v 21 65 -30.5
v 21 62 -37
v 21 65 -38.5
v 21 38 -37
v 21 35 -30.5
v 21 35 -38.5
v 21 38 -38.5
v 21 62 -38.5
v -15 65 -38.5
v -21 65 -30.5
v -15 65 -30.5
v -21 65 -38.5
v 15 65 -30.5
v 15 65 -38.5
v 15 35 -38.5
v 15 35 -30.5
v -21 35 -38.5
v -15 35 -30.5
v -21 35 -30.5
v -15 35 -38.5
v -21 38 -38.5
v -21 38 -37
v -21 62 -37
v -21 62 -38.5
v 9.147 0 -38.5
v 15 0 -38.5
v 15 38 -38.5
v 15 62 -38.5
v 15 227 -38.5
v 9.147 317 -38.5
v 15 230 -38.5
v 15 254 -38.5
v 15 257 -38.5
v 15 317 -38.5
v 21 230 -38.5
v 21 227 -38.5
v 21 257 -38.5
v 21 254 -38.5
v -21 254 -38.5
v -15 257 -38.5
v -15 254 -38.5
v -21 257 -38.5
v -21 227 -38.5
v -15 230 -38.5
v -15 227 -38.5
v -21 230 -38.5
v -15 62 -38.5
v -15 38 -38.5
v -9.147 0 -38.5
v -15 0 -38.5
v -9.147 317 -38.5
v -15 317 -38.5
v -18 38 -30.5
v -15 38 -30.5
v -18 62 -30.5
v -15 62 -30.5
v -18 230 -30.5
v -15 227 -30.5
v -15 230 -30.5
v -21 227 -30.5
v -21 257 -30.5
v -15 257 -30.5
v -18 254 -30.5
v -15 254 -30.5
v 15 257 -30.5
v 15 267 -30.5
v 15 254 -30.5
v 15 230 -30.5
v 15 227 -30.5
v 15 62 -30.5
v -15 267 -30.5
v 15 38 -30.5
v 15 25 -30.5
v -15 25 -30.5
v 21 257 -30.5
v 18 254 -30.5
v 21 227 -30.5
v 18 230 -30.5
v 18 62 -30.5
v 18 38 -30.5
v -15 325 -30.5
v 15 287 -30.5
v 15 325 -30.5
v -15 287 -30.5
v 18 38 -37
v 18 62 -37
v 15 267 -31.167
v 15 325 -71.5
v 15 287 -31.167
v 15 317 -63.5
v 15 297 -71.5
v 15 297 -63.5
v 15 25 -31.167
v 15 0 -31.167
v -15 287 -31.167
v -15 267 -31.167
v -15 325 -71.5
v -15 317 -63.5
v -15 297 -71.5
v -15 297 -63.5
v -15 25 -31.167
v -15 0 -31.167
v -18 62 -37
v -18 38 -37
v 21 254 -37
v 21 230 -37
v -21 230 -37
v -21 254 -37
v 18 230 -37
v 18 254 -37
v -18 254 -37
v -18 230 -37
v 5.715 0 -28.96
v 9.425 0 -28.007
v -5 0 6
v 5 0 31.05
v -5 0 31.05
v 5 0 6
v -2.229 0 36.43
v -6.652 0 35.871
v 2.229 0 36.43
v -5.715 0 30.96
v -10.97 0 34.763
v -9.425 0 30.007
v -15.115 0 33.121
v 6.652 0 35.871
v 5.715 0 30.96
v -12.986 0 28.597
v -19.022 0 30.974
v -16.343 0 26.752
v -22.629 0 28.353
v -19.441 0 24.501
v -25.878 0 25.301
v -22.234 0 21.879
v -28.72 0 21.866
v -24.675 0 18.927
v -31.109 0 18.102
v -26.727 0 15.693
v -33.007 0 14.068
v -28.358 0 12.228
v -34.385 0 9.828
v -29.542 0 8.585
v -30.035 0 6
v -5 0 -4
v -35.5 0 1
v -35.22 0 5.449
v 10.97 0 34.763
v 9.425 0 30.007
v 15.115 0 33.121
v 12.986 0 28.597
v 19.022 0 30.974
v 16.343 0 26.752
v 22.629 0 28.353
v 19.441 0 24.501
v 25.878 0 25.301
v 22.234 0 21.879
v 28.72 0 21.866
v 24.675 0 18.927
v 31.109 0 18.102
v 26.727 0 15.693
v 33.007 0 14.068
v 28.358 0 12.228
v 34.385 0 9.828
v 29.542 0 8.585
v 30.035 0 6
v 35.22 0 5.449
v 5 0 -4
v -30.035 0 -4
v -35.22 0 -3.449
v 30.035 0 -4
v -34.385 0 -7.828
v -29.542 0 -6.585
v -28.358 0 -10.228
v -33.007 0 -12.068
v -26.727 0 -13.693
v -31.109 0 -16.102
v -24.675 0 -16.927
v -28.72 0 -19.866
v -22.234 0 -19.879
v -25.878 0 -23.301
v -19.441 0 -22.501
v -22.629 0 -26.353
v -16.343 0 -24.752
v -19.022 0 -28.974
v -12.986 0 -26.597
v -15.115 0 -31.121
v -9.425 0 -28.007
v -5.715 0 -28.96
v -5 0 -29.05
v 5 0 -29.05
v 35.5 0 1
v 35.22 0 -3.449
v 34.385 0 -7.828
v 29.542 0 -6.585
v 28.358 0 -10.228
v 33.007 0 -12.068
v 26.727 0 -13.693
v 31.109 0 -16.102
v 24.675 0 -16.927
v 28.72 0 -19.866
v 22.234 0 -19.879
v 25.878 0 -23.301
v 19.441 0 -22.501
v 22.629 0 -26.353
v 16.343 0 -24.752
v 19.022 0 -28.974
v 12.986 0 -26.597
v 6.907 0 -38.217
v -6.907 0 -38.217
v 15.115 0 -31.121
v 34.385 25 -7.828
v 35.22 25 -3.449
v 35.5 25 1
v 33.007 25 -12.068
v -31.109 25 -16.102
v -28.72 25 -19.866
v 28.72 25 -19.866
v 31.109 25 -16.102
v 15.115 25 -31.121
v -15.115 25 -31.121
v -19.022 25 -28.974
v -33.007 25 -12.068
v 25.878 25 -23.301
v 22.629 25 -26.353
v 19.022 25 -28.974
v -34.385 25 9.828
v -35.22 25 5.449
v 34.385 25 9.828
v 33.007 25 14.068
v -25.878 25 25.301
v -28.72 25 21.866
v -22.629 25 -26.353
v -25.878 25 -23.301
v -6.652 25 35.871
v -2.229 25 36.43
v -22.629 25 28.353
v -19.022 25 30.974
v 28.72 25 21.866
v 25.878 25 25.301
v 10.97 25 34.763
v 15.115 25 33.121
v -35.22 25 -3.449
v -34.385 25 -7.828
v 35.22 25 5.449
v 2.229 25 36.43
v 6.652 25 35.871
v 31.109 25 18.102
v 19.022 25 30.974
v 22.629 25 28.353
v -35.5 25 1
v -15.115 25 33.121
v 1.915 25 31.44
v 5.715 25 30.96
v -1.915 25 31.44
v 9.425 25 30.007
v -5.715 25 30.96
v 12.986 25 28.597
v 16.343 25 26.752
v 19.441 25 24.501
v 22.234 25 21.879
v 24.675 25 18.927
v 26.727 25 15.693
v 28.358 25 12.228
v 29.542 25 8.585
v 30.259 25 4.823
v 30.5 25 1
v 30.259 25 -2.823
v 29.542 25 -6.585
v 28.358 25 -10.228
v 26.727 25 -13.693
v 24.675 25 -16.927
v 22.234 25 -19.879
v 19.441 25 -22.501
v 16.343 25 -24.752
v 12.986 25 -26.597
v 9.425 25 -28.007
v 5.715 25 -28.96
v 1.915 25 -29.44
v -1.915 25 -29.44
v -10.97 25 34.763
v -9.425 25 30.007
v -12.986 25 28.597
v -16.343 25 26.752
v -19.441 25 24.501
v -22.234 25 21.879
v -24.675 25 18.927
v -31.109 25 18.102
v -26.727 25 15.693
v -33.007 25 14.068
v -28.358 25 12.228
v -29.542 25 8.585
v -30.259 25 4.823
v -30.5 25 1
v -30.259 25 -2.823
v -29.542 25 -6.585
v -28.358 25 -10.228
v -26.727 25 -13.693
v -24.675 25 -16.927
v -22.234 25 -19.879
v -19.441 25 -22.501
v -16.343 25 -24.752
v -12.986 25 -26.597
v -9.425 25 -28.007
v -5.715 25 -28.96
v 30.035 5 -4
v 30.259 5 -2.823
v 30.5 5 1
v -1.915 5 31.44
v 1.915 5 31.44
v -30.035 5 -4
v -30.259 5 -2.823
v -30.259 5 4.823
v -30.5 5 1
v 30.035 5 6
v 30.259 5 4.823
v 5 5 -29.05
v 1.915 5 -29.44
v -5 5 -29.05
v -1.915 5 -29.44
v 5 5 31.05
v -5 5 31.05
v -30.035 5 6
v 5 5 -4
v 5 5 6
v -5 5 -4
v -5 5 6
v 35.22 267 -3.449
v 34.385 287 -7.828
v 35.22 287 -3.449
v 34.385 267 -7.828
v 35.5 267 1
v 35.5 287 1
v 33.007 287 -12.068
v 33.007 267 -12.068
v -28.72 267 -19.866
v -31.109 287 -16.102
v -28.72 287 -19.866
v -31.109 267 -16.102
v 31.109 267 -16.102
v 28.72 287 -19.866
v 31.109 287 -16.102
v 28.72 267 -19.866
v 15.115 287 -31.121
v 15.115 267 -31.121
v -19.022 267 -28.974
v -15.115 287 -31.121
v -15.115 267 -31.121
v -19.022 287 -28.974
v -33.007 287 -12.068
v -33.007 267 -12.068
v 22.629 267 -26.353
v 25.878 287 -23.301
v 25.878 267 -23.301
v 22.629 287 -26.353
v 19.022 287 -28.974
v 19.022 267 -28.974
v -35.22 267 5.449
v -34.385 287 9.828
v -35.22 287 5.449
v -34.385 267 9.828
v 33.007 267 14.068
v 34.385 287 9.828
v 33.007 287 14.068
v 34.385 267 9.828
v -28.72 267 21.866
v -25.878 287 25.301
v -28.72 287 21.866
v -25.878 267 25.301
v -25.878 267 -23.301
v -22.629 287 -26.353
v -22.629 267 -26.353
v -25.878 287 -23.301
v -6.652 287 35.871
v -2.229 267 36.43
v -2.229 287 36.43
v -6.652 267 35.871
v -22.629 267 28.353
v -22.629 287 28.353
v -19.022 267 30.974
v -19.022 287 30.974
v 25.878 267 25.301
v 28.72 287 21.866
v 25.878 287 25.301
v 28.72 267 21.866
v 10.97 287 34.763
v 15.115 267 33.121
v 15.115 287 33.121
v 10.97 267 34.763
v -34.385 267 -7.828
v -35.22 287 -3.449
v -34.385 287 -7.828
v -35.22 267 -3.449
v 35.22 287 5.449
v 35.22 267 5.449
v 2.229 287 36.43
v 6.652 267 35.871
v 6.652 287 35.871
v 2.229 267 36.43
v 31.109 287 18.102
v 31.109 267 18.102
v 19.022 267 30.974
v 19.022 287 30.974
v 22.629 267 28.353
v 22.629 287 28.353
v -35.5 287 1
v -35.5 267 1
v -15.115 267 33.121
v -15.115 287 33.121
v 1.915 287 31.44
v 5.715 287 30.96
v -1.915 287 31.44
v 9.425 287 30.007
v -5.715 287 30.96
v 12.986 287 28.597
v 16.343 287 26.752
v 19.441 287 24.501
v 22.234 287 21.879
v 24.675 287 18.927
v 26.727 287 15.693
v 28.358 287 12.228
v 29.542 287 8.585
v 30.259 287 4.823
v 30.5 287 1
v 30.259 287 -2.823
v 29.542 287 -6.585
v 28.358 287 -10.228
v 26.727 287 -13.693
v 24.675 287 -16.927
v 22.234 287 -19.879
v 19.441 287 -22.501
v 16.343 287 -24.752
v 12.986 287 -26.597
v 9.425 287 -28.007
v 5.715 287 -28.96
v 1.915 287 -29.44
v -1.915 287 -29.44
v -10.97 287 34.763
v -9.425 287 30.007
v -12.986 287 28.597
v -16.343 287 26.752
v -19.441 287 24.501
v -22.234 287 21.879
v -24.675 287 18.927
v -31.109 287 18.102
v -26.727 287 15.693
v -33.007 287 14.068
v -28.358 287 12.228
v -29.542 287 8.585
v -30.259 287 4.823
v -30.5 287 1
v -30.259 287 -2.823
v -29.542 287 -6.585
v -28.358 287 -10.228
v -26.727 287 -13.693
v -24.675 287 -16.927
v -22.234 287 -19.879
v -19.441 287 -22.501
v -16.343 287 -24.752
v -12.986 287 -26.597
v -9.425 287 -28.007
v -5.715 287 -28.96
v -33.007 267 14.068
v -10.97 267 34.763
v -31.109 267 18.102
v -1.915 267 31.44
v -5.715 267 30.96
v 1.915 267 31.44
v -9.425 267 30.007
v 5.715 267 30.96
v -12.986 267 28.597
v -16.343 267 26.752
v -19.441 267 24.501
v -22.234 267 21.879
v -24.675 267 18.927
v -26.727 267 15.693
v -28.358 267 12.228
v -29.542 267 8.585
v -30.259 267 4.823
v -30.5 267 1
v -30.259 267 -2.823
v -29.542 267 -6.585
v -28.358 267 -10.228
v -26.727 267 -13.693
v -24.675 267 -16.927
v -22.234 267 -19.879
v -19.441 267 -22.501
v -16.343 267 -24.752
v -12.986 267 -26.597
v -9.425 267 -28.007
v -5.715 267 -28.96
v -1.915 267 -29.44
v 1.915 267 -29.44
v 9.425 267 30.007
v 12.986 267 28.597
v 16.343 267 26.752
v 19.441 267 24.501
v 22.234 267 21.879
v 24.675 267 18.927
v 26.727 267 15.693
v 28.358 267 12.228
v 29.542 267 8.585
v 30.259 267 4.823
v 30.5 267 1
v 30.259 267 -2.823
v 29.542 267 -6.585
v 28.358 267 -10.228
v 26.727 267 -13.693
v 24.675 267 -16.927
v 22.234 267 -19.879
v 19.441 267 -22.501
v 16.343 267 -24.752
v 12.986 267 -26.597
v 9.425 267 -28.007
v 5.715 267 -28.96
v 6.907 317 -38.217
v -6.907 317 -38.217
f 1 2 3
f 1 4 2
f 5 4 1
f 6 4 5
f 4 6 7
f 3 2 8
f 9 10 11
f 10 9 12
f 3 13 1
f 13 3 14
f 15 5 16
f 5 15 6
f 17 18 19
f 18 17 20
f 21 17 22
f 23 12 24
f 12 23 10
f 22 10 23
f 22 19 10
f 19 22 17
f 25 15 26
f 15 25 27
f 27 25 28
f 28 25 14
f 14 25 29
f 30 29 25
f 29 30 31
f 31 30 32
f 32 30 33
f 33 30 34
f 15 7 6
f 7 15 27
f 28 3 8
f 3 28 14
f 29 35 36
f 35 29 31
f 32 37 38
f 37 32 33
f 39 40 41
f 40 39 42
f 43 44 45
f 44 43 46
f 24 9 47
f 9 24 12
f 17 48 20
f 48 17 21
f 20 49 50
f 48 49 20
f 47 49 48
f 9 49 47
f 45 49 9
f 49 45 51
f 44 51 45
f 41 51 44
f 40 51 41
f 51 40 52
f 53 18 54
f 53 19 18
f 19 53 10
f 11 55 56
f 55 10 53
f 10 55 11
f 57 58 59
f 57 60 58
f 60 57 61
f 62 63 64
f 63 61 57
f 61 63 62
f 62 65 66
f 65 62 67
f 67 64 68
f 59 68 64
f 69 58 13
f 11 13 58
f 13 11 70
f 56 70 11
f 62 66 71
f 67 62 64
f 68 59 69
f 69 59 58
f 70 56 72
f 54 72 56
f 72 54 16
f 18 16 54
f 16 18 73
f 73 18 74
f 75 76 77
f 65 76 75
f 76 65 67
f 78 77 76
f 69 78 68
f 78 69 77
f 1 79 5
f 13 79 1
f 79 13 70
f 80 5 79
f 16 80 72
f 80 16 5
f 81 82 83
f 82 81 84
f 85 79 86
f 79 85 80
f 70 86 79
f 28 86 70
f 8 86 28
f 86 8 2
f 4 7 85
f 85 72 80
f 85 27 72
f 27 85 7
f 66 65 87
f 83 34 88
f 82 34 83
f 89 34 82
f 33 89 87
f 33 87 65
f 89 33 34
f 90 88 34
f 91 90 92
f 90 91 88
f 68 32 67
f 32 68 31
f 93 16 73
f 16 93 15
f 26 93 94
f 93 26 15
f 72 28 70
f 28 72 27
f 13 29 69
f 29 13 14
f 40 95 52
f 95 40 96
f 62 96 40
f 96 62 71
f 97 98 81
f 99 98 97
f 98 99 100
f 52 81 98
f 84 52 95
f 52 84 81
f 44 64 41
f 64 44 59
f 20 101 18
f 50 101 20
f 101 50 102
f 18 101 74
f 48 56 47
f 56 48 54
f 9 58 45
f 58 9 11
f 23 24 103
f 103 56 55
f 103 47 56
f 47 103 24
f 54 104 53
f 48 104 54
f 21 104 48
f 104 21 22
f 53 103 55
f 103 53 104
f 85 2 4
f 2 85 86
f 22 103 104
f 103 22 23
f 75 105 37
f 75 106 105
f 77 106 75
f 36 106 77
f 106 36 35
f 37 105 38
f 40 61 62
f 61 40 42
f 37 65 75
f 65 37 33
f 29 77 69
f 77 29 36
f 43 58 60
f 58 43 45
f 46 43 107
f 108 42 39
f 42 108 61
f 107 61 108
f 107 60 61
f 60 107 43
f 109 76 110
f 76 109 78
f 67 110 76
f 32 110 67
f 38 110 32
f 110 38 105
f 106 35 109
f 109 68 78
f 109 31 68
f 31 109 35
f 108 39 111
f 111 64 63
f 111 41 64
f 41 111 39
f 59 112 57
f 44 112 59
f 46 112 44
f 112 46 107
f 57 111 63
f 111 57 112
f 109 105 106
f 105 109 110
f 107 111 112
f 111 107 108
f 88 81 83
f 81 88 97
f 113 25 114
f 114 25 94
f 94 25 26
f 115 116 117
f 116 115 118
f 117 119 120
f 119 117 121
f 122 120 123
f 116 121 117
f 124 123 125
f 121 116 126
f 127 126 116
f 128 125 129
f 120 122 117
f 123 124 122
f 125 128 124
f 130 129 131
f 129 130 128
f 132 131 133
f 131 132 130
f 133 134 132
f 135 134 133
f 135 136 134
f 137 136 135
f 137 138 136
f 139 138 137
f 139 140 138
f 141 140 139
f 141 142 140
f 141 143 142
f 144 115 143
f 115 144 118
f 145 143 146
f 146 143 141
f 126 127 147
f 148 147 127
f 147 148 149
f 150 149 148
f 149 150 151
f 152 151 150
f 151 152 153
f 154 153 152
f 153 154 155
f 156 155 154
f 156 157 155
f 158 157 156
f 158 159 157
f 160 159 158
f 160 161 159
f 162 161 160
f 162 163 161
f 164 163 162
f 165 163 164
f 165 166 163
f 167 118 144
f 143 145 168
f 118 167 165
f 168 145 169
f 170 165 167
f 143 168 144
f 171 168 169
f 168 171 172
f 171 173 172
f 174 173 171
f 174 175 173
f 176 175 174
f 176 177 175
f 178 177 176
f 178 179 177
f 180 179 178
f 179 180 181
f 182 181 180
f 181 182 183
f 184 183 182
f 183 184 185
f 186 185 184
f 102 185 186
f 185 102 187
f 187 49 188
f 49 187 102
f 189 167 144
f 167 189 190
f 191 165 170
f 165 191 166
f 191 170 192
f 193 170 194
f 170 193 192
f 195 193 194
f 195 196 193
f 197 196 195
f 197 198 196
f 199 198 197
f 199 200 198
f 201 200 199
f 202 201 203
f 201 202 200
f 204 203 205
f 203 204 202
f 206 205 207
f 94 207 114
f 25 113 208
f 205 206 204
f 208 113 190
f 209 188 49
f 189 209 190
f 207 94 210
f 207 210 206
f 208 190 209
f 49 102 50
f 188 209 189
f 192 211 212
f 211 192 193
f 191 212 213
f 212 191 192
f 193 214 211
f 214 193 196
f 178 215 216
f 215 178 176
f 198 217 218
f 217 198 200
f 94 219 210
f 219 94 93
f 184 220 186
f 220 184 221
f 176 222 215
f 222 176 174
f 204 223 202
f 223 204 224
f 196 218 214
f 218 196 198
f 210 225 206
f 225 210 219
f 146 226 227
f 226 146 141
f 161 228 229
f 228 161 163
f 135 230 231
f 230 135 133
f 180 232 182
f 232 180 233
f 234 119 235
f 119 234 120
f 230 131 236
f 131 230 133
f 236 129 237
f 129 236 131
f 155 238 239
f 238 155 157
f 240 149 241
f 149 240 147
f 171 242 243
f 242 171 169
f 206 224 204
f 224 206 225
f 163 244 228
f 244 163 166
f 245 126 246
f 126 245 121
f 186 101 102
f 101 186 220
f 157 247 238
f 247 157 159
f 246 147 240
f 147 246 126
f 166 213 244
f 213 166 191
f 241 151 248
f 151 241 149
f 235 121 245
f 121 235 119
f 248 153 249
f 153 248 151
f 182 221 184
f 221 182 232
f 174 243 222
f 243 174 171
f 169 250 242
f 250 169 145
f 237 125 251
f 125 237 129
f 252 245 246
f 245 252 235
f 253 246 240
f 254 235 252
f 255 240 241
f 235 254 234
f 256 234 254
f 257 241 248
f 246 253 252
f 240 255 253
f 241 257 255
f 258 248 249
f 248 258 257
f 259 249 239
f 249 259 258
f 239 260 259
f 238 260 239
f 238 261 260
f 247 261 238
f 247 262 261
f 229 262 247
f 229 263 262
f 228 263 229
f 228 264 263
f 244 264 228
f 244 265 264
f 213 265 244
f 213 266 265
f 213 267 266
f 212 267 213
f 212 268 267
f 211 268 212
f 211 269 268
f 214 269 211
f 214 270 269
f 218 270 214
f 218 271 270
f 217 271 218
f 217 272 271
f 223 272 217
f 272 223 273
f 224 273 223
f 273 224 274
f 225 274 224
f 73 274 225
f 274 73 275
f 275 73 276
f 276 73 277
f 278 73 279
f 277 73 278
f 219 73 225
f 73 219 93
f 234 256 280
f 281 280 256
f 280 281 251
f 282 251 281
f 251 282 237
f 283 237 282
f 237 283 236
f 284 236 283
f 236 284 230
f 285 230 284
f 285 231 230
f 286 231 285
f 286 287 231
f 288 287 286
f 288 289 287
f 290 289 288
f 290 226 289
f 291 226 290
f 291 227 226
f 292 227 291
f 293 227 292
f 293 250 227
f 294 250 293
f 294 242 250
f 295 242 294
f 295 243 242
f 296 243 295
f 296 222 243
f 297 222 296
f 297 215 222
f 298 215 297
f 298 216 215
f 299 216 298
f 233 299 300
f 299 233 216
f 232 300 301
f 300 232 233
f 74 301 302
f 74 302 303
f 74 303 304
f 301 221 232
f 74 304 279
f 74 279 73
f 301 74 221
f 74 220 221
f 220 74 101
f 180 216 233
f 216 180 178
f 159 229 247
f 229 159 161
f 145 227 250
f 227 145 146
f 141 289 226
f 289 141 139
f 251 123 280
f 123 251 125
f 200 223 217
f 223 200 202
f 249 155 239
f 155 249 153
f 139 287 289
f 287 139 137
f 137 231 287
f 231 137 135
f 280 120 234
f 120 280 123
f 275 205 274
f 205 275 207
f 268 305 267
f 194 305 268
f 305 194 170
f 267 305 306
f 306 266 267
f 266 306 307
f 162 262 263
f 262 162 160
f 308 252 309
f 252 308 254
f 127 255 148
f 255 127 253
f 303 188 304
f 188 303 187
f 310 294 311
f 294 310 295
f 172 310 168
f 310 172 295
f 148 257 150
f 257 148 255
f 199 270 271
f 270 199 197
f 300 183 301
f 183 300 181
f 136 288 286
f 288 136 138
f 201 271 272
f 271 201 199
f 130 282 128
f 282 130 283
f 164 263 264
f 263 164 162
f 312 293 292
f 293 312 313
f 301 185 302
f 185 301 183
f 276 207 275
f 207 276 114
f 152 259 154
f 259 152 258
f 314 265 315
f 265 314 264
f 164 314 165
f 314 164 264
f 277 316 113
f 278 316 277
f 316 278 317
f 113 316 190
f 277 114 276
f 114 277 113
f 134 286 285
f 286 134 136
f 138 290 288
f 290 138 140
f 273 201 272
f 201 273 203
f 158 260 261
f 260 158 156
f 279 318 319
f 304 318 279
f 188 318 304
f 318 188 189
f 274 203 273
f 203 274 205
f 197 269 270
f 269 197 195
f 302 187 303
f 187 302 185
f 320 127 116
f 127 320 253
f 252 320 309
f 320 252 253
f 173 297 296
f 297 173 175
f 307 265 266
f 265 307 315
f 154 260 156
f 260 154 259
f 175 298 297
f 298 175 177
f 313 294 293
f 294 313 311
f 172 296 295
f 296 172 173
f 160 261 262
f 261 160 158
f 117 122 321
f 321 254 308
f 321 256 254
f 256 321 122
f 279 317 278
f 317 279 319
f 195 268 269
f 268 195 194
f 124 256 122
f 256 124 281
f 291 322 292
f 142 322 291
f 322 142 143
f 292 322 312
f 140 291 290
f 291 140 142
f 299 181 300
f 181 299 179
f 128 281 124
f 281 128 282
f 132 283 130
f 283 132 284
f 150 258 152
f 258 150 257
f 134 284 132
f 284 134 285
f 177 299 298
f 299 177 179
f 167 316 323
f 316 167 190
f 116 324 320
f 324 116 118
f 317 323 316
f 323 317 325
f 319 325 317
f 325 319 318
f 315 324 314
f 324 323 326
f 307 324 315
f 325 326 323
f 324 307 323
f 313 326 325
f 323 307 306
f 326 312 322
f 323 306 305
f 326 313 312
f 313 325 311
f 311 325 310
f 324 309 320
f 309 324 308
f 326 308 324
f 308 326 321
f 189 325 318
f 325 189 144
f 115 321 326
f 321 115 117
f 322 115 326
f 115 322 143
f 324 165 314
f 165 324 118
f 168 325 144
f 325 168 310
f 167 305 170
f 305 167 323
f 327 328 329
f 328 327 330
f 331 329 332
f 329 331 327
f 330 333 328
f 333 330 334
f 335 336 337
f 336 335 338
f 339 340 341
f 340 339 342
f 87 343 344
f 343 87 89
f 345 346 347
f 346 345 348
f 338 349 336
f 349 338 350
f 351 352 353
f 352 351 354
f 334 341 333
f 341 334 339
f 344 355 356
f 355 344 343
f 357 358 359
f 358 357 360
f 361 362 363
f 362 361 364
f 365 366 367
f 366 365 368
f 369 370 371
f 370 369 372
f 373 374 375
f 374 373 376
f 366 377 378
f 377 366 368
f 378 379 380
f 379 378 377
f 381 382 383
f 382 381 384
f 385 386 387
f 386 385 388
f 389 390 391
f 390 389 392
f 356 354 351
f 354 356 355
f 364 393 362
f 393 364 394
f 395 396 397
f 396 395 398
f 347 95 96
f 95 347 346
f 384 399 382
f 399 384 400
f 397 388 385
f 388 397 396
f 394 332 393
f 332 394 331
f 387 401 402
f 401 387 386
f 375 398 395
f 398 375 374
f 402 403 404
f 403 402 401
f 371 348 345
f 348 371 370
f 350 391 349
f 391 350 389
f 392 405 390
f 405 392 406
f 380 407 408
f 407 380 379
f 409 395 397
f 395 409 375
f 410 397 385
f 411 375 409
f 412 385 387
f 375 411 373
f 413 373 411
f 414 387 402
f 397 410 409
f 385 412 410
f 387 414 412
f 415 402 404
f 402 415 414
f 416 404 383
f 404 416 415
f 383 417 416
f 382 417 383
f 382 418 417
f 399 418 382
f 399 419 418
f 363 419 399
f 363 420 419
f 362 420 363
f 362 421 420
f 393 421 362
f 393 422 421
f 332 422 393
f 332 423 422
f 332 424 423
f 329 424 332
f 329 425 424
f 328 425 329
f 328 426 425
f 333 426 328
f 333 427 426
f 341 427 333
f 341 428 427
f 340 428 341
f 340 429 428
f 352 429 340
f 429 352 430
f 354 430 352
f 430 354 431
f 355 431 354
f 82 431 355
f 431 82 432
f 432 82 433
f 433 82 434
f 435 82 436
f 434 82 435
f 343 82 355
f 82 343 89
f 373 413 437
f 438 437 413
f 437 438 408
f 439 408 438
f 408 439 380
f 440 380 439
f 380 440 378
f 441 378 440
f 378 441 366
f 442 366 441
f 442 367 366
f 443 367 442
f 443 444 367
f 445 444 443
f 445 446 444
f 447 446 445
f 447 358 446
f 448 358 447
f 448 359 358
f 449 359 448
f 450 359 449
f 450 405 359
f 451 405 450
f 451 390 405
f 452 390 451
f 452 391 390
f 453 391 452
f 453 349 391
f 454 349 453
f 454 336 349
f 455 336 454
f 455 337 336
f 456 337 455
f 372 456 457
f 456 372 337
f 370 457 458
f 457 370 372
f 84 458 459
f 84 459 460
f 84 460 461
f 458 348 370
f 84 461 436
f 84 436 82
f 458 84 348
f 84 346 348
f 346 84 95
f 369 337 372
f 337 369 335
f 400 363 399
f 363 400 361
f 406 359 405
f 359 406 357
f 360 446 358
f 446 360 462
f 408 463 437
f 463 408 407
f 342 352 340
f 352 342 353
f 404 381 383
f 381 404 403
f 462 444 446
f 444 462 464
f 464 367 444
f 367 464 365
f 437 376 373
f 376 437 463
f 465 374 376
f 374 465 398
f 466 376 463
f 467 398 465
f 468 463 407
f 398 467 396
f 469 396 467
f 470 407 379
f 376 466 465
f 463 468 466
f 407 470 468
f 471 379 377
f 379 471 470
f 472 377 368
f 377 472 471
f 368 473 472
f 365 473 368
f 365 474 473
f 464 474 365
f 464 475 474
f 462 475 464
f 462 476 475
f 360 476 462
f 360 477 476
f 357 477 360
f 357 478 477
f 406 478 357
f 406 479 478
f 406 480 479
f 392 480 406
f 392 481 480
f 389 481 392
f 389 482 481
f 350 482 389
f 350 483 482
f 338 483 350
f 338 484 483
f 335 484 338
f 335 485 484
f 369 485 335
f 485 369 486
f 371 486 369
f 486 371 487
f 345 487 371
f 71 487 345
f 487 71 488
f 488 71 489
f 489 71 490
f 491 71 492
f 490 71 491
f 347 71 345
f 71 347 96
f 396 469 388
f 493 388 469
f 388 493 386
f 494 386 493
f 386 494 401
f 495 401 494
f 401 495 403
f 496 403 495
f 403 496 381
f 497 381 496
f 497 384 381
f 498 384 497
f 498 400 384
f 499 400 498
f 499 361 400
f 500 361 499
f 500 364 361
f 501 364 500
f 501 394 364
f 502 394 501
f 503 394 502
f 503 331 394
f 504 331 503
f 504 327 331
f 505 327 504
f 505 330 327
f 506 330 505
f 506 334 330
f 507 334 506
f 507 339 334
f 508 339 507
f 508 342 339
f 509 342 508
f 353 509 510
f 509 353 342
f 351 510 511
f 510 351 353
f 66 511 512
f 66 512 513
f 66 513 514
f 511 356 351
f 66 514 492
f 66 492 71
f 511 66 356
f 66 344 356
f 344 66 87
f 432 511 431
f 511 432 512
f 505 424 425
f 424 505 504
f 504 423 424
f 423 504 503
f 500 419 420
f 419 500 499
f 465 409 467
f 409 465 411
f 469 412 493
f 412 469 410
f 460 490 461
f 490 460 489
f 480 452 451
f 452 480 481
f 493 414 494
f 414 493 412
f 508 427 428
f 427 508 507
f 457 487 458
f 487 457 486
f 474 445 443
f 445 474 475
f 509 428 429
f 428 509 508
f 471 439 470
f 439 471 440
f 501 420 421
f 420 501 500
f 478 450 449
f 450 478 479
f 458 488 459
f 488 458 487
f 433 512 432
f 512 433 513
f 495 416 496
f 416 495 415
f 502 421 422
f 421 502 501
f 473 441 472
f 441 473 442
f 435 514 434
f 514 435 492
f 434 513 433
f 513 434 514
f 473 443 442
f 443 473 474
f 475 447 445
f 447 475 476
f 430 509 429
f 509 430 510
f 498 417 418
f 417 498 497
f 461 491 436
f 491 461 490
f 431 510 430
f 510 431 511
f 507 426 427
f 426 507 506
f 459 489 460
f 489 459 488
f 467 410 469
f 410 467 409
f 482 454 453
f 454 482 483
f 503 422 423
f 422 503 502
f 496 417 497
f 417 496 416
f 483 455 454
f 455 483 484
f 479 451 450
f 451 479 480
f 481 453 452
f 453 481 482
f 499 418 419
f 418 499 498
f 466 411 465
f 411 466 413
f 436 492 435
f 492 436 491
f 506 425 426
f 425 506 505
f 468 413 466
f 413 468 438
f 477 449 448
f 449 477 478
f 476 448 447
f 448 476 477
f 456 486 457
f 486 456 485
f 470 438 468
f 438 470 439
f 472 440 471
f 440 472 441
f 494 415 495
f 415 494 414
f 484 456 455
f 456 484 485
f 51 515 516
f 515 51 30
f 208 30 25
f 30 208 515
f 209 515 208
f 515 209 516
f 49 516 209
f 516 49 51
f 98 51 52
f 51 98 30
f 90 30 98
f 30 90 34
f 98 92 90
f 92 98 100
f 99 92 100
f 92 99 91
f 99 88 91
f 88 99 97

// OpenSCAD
// Customizable Sodastream bottle holder for Cornelius kegs
// Copyright: Olle Wreede 2019
// License: CC BY-SA

//CUSTOMIZER VARIABLES

/* [Holder] */

// Thickness in mm of the holder connecting the collars
thickness_of_holder = 8; // [5:10]

// Width in mm of the holder connecting the collars
width_of_holder = 30; // [10:50]

// This is the total height in mm of the holder
height_of_holder = 325; // [175:350]

/* [Collars] */

// Position in mm of upper collar
upper_collar_position = 267; // [150:300]

// The height in mm of each collar around the Sodastream bottle
height_of_collars = 20; // [10:50]

// Thickness in mm of collar walls
thickness_of_collars = 5; // [3:10]

// Thickness in mm of the cross at the bottom of the base collar
thickness_of_bottom = 5; // [3:10]

// Width in mm of the Sodastream bottle
inner_width_of_collars = 60; // [60:70]

// Width in mm of support struts in base collar
base_support_width = 10; // [5:0.5:15]

/* [Hook] */

// Depth in mm of the hook at the top
depth_of_hook = 25; // [10:40]

// Height in mm of the hook from the top
height_of_hook = 20; // [5:30]

/* [Buckles] */

// Height in mm of the strap buckles
height_of_buckle = 30; // [20:50]

// Position in mm of lower buckle
lower_buckle_position = 50; // [25:150]

// Position in mm of upper buckle
upper_buckle_position = 242; // [150:250]

//CUSTOMIZER VARIABLES END

/* [Hidden] */

$fn=50;

BASE_WIDTH = inner_width_of_collars + 1; // Adding some tolerance
OUTER_DIAMETER = BASE_WIDTH + thickness_of_collars * 2;
HOLDER_POSITION = BASE_WIDTH / 2 + thickness_of_holder / 2;

KEG_RADIUS = 110;
// Todo select between different keg radius versions

STRAP_BUCKLE_WALL = 3;
STRAP_THICKNESS = 3;
STRAP_WIDTH = height_of_buckle - STRAP_BUCKLE_WALL * 2;
STRAP_BUCKLE_WIDTH = width_of_holder + STRAP_THICKNESS * 2 + STRAP_BUCKLE_WALL * 2;

// Hanger
module hanger() {
    translate([0, HOLDER_POSITION, height_of_holder / 2]) {
        cube(size = [width_of_holder, thickness_of_holder, height_of_holder], center = true);
    }
    
    // Lower strap buckle
    translate([0, HOLDER_POSITION, lower_buckle_position]) {
        strap_buckle();
    }

    // Upper strap buckle
    translate([0, HOLDER_POSITION, upper_buckle_position]) {
        strap_buckle();
    }
}

module base_collar() {
     difference() {
        cylinder(h=thickness_of_bottom + height_of_collars, d=OUTER_DIAMETER);
        cylinder(h=height_of_collars * 2, d=BASE_WIDTH);
     }

 }
module base() {
    base_collar();
    
    // Base supports
    translate([0, 0, thickness_of_bottom / 2]) {
        cube([base_support_width, BASE_WIDTH + thickness_of_collars, thickness_of_bottom], center=true);
        rotate([0, 0, 90])
            cube([base_support_width, BASE_WIDTH + thickness_of_collars, thickness_of_bottom], center=true);
    }
}

module upper_collar() {
    translate([0, 0, upper_collar_position]) {
        difference() {
            cylinder(h=height_of_collars, d=OUTER_DIAMETER);
            cylinder(h=height_of_collars, d=BASE_WIDTH);
        }
    }    
}

module strap_buckle() {
    difference() {
        cube([STRAP_BUCKLE_WIDTH, thickness_of_holder, height_of_buckle], center=true);

        // Strap holes
        translate([width_of_holder / 2 + STRAP_THICKNESS / 2, 0, 0]) {
            cube([STRAP_THICKNESS, thickness_of_holder, STRAP_WIDTH], center = true);
        }
        translate([0 - (width_of_holder / 2 + STRAP_THICKNESS / 2), 0, 0 ]) {
            cube([STRAP_THICKNESS, thickness_of_holder, STRAP_WIDTH], center = true);
        }
        
        // Make room for straps behind buckle
        strap_hole_pos = thickness_of_holder / 2 - STRAP_THICKNESS / 2 + 1;
        translate([width_of_holder / 2 + STRAP_THICKNESS, strap_hole_pos, 0]) {
            cube([STRAP_BUCKLE_WALL * 2, 2, STRAP_WIDTH], center = true);
        }
        translate([0 - (width_of_holder / 2 + STRAP_THICKNESS), strap_hole_pos, 0]) {
            cube([STRAP_BUCKLE_WALL * 2, 2, STRAP_WIDTH], center = true);
        }
    }
}

module hook() {
    // Horizontal lip
    translate([0, (BASE_WIDTH + depth_of_hook) / 2 + thickness_of_holder, height_of_holder - thickness_of_holder / 2]) {
        cube([width_of_holder, depth_of_hook, thickness_of_holder], center = true);
    }
    
    // Vertical hook
    translate([0, BASE_WIDTH / 2 + depth_of_hook + thickness_of_holder * 1.5, height_of_holder - height_of_hook / 2 - thickness_of_holder / 2]) {
        cube([width_of_holder, thickness_of_holder, height_of_hook + thickness_of_holder], true);
    } 
}

module holder() {
    hanger();
    translate([0, -1, 0]) base();
    translate([0, -1, 0]) upper_collar();
}

module drawHolder() {
    // Curved back of holder
    difference() {
        holder();
        
        // Make back rounded to fit keg
        translate([0, BASE_WIDTH / 2 + thickness_of_holder + KEG_RADIUS - 0.5, 0]) {
            cylinder(h=height_of_holder - thickness_of_holder, r=KEG_RADIUS, center=false);
        }
    }

    // Add hook (outside of holder, to not be in the way for the curved back)
    hook();
}

module rotatedHolder() {
    //translate([0, 0, - OUTER_DIAMETER / 2])
        rotate([-90, 0, 0])
            drawHolder();
}

rotatedHolder();
//drawHolder();
